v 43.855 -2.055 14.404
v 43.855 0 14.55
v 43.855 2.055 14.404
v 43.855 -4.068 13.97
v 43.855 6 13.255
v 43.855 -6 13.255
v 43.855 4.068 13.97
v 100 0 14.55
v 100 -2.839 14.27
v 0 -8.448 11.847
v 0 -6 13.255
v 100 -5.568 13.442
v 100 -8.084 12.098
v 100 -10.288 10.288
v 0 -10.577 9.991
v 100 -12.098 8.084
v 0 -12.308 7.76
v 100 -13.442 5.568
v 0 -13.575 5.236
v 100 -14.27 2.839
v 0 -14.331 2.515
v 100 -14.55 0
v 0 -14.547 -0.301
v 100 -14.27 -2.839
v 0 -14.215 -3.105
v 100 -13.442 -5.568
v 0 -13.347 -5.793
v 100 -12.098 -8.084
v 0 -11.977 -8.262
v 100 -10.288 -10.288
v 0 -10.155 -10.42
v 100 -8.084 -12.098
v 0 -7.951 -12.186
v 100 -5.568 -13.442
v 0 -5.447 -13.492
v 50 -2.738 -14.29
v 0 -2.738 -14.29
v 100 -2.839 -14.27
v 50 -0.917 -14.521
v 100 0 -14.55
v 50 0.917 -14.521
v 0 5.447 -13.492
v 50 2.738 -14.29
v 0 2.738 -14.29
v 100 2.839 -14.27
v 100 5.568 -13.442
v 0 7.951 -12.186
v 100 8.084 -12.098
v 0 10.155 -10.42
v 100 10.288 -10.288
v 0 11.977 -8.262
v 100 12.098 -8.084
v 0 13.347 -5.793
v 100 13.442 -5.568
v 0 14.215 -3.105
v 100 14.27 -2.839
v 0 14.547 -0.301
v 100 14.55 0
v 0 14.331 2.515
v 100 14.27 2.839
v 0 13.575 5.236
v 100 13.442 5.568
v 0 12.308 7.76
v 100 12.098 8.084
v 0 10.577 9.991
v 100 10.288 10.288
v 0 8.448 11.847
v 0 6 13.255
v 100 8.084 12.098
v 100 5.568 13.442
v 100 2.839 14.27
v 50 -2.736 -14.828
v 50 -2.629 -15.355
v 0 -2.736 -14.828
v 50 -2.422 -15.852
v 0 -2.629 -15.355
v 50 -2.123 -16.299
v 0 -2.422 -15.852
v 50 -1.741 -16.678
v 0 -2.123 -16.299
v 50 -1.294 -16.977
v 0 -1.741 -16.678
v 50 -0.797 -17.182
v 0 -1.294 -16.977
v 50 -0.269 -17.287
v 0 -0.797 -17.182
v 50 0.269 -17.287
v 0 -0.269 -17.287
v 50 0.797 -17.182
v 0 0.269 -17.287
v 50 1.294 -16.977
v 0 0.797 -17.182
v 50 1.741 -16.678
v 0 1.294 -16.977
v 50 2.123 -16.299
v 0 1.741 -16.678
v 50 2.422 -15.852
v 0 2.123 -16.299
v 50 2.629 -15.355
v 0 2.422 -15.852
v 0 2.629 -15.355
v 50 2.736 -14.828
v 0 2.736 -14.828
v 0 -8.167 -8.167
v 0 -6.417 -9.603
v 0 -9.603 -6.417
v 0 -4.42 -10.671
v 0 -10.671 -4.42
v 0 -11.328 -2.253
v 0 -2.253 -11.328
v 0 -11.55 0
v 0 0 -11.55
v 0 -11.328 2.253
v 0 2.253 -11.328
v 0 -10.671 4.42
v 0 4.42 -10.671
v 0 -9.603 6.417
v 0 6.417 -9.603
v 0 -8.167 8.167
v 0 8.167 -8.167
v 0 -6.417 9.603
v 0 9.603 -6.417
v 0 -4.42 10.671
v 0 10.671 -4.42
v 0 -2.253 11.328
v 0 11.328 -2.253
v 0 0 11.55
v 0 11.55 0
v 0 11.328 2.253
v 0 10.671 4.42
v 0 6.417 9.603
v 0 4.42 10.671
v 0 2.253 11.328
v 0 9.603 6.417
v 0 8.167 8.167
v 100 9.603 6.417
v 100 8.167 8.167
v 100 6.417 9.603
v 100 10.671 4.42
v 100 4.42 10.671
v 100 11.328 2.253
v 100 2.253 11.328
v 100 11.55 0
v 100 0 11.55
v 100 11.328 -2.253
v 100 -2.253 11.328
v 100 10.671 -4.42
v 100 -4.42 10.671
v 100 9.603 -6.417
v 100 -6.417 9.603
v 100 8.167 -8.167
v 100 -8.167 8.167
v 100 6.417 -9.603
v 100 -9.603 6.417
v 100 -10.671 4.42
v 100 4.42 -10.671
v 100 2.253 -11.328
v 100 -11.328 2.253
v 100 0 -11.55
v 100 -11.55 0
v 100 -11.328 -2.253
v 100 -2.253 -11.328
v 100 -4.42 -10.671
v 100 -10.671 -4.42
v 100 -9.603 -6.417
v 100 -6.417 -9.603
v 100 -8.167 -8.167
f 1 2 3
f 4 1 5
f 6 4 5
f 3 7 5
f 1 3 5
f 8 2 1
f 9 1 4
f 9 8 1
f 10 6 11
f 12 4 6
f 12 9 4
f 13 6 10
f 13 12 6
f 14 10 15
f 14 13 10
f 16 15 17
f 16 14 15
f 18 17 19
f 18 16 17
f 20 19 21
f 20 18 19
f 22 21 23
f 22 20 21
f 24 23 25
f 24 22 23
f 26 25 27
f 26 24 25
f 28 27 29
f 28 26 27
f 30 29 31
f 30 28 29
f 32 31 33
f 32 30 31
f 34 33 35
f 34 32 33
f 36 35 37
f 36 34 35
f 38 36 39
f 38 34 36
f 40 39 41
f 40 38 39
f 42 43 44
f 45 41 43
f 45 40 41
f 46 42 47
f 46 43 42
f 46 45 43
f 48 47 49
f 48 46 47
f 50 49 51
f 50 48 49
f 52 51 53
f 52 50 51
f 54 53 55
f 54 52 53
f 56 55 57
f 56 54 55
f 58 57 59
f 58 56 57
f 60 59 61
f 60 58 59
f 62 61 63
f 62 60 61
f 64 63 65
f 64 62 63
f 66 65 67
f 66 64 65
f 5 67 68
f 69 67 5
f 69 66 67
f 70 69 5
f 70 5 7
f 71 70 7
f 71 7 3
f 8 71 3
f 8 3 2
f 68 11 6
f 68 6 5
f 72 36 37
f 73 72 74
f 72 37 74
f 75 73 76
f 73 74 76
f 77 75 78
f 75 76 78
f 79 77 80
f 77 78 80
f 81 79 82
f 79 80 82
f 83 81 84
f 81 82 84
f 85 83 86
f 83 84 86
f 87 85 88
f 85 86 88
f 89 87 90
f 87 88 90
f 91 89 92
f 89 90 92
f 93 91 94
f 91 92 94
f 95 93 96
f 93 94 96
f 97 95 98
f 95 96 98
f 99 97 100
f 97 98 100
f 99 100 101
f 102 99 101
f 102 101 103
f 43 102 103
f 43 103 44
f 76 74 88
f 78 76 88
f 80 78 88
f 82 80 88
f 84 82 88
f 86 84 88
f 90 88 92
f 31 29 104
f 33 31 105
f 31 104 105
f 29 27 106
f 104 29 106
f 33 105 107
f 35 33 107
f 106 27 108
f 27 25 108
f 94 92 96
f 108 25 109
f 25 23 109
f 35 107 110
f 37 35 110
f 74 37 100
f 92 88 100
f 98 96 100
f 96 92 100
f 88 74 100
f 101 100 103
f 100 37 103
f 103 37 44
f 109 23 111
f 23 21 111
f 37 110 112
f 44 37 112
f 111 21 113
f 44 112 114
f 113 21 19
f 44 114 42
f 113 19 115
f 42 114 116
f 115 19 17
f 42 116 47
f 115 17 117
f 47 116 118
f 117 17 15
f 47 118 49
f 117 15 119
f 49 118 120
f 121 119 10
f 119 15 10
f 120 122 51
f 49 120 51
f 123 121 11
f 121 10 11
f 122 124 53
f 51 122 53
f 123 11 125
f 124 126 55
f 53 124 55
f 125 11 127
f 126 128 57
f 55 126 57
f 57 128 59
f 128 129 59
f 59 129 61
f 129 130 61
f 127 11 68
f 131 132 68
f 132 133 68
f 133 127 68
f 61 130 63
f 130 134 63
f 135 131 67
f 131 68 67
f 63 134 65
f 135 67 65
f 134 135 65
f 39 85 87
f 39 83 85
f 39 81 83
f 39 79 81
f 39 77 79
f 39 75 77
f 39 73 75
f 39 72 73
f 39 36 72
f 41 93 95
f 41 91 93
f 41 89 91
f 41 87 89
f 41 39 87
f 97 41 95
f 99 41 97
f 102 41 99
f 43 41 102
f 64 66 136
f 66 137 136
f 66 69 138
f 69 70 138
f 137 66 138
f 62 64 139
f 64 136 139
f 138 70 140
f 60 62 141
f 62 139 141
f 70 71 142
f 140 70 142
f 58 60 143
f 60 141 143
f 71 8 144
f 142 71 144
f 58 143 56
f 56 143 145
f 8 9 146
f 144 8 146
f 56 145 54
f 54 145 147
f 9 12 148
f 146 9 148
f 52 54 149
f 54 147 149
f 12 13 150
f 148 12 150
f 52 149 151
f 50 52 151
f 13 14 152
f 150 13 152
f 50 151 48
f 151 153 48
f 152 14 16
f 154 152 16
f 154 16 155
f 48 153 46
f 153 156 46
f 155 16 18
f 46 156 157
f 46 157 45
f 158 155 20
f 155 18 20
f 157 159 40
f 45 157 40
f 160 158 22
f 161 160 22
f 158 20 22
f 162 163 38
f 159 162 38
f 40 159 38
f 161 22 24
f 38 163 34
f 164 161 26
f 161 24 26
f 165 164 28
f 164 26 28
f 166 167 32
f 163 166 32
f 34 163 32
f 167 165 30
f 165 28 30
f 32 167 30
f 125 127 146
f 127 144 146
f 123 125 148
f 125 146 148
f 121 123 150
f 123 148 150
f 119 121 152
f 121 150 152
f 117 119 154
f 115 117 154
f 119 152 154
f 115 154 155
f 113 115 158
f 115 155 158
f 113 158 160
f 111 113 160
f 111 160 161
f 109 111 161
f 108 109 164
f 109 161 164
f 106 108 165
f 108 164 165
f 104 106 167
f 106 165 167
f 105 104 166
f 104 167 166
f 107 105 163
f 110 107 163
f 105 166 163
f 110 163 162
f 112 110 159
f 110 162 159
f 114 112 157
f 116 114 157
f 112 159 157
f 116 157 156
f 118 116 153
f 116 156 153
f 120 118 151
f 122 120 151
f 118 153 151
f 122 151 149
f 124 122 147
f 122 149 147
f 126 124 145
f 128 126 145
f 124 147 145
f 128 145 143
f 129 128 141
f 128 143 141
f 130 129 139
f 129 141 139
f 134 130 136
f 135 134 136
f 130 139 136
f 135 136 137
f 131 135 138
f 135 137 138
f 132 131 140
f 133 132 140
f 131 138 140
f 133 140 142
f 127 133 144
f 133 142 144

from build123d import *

# Parameters (mm, degrees)
F0_W     = 100
F0_H     = 3
F2_W     = 12
F2_H     = 5
F3_DEPTH = 43.855205
F4_R     = 2.75
F5_DEPTH = 50


with BuildPart() as f1:
    # F0 (on Front) → F1 (revolve)
    with BuildSketch(Plane.XZ):
        with Locations((50, 13.05)):
            Rectangle(F0_W, F0_H)
    revolve(axis=Axis((1.032291, 0, 0), (1, 0, 0)))

    # F2 (on Right) → F3 (cut)
    with BuildSketch(Plane.YZ):
        with Locations((0, 15.755282)):
            Rectangle(F2_W, F2_H)
    extrude(amount=F3_DEPTH, mode=Mode.SUBTRACT)

    # F4 (on Right) → F5 (join)
    with BuildSketch(Plane.YZ):
        with Locations((0, -14.55)):
            Circle(F4_R)
    extrude(amount=F5_DEPTH)


solid = f1.part
